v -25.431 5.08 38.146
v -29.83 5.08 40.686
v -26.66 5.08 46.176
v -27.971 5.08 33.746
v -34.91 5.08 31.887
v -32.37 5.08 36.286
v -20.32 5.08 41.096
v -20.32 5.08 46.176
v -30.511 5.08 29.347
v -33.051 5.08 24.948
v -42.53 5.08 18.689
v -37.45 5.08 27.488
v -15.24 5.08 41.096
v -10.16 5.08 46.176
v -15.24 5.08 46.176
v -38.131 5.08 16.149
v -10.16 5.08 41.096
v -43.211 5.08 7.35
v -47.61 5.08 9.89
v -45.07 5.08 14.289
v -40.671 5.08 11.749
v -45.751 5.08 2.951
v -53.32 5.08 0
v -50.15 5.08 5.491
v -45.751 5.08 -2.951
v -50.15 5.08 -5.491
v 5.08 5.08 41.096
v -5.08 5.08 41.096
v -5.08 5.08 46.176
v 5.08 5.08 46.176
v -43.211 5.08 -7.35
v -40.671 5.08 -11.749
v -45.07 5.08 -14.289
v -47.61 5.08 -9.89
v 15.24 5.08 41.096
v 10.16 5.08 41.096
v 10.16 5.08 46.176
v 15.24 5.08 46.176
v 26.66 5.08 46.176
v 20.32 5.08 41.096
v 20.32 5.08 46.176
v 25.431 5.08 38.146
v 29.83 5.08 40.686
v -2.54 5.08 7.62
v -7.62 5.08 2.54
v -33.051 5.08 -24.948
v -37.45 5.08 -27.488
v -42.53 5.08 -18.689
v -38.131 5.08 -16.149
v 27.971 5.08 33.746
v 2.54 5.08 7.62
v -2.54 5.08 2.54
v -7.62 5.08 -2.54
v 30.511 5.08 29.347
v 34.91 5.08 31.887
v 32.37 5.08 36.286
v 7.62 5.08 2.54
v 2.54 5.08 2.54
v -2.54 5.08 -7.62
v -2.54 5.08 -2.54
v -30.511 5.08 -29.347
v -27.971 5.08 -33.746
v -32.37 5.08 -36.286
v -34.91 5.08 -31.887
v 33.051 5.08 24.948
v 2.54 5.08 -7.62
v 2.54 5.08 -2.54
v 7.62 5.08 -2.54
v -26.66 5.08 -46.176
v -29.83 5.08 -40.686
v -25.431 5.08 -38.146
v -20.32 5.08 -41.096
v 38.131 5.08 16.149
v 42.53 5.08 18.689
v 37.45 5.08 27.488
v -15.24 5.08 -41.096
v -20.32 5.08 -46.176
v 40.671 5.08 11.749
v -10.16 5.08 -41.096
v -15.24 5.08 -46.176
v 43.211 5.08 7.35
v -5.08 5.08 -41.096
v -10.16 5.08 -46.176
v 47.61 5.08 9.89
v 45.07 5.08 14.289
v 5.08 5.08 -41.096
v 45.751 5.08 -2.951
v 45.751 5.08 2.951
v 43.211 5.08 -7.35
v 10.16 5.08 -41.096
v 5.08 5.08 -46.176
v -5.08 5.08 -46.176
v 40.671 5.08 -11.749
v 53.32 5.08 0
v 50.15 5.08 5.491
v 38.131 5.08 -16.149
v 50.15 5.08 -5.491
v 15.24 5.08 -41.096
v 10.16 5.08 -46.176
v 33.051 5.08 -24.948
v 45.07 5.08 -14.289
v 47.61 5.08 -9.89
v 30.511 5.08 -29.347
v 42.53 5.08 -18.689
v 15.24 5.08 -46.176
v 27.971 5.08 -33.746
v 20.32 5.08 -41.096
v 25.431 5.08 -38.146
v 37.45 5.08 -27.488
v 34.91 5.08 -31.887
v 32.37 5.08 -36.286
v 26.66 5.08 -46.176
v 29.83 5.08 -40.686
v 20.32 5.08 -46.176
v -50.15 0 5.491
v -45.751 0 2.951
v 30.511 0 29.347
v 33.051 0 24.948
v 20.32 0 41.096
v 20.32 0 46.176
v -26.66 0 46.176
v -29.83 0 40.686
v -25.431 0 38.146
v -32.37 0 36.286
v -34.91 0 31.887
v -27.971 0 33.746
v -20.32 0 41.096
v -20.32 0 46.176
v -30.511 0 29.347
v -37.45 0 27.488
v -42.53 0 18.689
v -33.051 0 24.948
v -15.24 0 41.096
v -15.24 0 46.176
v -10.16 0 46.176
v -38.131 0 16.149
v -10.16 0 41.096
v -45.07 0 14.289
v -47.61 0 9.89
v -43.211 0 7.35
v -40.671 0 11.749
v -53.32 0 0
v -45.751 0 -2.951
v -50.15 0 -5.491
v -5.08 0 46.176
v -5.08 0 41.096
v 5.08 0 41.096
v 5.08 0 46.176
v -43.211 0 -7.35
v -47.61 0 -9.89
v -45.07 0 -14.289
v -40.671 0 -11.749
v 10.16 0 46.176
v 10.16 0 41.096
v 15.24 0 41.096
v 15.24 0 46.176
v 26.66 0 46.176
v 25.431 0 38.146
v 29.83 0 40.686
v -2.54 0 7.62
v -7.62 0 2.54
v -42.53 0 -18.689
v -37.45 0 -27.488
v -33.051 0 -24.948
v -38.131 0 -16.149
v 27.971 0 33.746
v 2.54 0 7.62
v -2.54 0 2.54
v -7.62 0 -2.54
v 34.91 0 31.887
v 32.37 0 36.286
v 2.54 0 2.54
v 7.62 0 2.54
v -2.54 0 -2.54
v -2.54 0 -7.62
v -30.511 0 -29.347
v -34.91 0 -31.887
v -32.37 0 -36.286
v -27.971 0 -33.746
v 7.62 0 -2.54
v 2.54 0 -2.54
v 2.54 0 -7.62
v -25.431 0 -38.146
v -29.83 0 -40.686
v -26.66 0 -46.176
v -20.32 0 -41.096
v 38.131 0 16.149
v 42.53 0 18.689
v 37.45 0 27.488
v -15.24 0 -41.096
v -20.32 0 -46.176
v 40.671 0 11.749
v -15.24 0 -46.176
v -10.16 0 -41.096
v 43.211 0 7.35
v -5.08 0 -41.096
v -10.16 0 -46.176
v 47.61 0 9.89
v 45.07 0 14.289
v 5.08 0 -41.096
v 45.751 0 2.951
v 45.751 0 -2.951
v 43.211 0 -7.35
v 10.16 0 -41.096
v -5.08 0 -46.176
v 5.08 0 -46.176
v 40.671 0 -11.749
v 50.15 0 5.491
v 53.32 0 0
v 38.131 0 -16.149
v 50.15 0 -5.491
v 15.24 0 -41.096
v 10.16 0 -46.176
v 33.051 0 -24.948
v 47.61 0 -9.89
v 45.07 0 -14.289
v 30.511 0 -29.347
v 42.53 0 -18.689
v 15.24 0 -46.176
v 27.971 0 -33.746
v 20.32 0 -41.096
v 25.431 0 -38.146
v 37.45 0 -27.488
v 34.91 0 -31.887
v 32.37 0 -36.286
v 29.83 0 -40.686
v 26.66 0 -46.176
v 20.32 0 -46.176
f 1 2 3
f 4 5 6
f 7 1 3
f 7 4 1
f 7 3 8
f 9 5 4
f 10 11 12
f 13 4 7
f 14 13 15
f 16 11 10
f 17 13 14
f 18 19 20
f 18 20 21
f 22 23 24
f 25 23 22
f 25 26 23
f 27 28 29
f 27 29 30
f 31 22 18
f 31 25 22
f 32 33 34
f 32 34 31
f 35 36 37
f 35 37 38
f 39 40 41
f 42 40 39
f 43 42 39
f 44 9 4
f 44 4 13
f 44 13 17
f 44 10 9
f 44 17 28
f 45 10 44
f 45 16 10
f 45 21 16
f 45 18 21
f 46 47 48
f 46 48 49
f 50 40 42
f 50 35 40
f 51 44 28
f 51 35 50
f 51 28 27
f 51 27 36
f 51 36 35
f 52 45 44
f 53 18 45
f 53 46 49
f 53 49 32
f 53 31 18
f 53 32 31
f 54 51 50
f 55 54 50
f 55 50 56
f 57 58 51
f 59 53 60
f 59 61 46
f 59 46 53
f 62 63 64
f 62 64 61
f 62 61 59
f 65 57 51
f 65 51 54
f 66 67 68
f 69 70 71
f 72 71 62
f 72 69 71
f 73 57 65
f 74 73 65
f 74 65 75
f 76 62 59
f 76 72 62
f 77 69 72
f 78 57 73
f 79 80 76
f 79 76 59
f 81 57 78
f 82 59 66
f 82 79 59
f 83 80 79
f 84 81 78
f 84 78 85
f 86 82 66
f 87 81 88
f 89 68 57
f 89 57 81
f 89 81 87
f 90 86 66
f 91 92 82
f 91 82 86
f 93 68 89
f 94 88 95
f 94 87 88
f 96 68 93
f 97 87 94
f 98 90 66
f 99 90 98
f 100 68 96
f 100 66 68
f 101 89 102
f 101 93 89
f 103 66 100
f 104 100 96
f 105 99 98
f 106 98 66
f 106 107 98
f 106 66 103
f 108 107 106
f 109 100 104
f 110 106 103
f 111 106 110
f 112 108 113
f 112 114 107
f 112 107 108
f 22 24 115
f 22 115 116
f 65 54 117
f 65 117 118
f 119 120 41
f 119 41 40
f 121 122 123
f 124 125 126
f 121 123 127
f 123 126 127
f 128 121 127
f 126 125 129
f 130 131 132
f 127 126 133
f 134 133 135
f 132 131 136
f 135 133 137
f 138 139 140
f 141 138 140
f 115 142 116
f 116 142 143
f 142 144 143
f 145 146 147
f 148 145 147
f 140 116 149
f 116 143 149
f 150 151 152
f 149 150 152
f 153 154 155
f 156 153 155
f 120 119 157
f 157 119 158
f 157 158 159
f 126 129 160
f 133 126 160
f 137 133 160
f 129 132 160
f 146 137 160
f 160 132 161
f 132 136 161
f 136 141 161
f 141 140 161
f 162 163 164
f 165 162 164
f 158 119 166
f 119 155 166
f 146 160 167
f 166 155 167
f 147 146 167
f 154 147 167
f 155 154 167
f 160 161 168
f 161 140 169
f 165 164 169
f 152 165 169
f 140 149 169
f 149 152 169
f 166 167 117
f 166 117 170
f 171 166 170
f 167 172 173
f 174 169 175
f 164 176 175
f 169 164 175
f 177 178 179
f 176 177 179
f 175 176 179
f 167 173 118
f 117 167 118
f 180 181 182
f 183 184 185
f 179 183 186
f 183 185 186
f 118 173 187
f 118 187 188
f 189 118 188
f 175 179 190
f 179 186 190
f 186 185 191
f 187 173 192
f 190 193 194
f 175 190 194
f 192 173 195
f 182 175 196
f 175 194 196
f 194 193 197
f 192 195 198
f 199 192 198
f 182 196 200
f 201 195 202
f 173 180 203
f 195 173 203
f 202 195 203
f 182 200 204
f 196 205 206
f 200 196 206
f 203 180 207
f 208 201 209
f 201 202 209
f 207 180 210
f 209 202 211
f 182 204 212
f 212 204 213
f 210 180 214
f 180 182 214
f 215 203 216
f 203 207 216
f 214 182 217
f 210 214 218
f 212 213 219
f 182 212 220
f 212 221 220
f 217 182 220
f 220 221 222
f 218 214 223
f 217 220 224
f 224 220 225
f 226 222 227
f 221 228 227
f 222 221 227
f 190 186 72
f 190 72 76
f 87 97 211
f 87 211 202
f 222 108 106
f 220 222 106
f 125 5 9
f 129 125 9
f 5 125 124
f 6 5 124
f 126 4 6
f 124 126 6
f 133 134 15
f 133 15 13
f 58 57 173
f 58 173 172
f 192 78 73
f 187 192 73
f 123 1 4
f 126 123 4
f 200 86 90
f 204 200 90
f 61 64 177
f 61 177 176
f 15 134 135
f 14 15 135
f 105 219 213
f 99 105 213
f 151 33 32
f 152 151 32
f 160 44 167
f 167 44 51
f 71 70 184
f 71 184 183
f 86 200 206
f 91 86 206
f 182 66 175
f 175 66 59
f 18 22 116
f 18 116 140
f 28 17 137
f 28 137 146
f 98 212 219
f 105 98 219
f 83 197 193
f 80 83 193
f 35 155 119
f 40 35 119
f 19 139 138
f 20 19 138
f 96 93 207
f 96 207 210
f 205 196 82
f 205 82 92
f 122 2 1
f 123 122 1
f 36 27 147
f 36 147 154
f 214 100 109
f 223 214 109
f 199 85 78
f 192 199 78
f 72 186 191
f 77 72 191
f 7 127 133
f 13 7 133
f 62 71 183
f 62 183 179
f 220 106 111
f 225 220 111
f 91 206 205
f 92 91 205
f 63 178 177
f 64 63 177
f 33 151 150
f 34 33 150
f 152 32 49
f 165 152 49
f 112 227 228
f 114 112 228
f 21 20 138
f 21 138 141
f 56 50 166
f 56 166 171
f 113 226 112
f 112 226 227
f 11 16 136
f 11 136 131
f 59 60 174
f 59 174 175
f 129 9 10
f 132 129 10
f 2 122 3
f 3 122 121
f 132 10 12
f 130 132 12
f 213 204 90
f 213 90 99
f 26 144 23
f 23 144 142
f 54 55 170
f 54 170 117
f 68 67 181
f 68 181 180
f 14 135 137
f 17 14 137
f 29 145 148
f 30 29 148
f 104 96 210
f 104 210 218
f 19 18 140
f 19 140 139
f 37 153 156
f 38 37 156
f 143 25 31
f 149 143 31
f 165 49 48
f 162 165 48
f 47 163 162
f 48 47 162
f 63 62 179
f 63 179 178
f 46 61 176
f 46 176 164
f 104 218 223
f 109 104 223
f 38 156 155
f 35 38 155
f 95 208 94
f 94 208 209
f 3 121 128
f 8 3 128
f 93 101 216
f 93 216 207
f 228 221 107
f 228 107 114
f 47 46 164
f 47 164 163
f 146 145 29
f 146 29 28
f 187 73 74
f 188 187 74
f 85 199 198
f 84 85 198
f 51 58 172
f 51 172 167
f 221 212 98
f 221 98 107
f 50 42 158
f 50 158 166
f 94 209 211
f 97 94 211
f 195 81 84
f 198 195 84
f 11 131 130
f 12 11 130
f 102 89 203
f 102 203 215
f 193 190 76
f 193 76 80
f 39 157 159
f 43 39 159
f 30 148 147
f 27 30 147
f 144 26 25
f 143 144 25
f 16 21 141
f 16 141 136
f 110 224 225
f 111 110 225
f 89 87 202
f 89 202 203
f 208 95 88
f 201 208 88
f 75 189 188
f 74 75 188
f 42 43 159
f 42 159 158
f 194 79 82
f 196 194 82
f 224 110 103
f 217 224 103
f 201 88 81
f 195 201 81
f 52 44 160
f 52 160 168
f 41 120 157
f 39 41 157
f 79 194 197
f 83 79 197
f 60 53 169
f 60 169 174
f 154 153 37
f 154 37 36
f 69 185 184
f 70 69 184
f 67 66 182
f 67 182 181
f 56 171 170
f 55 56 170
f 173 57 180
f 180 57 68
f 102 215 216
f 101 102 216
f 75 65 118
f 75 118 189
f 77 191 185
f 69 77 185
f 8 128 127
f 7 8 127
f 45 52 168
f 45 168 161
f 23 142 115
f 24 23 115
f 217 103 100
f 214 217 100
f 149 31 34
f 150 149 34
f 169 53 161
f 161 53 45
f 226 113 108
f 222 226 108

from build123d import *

# Parameters (mm, degrees)
BOSS_EXTRUDE1_DEPTH = 5.08
SKETCH3_W           = 5.08
SKETCH3_H           = 5.08
CUT_EXTRUDE1_DEPTH  = 5.08
CUT_EXTRUDE2_DEPTH  = 5.08


with BuildPart() as part:
    # Sketch1 → Boss-Extrude1 (new body)
    with BuildSketch(Plane(origin=(0, 0, 0), x_dir=(1, 0, 0), z_dir=(0, 1, 0))):
        Polygon((53.32, 0), (26.66, 46.17647453), (-26.66, 46.17647453), (-53.32, 0), (-26.66, -46.17647453), (26.66, -46.17647453), align=None)
    extrude(amount=BOSS_EXTRUDE1_DEPTH)

    # Sketch3 → Cut-Extrude1 (cut)
    with BuildSketch(Plane(origin=(0, 5.08, 0), x_dir=(1, 0, 0), z_dir=(0, 1, 0))):
        with Locations((-17.78, 43.63647453)):
            Rectangle(SKETCH3_W, SKETCH3_H)
        with Locations((7.62, 43.63647453)):
            Rectangle(SKETCH3_W, SKETCH3_H)
        with Locations((17.78, 43.63647453)):
            Rectangle(SKETCH3_W, SKETCH3_H)
        with Locations((-7.62, 43.63647453)):
            Rectangle(SKETCH3_W, SKETCH3_H)
        Polygon((29.83, 40.68587347), (25.430590949, 38.14587347), (27.970590949, 33.746464419), (32.37, 36.286464419), align=None)
        Polygon((42.53, 18.688828214), (45.07, 14.289419162), (40.670590949, 11.749419162), (38.130590949, 16.148828214), align=None)
        Polygon((47.61, 9.890010111), (50.15, 5.49060106), (45.750590949, 2.95060106), (43.210590949, 7.350010111), align=None)
        Polygon((34.91, 31.887055367), (30.510590949, 29.347055367), (33.050590949, 24.947646316), (37.45, 27.487646316), align=None)
        Polygon((50.15, -5.49060106), (45.750590949, -2.95060106), (43.210590949, -7.350010111), (47.61, -9.890010111), align=None)
        Polygon((37.45, -27.487646316), (34.91, -31.887055367), (30.510590949, -29.347055367), (33.050590949, -24.947646316), align=None)
        Polygon((32.37, -36.286464419), (29.83, -40.68587347), (25.430590949, -38.14587347), (27.970590949, -33.746464419), align=None)
        Polygon((45.07, -14.289419162), (40.670590949, -11.749419162), (38.130590949, -16.148828214), (42.53, -18.688828214), align=None)
        with Locations((17.78, -43.63647453)):
            Rectangle(SKETCH3_W, SKETCH3_H)
        with Locations((-7.62, -43.63647453)):
            Rectangle(SKETCH3_W, SKETCH3_H)
        with Locations((-17.78, -43.63647453)):
            Rectangle(SKETCH3_W, SKETCH3_H)
        with Locations((7.62, -43.63647453)):
            Rectangle(SKETCH3_W, SKETCH3_H)
        Polygon((-29.83, -40.68587347), (-25.430590949, -38.14587347), (-27.970590949, -33.746464419), (-32.37, -36.286464419), align=None)
        Polygon((-42.53, -18.688828214), (-45.07, -14.289419162), (-40.670590949, -11.749419162), (-38.130590949, -16.148828214), align=None)
        Polygon((-47.61, -9.890010111), (-50.15, -5.49060106), (-45.750590949, -2.95060106), (-43.210590949, -7.350010111), align=None)
        Polygon((-34.91, -31.887055367), (-30.510590949, -29.347055367), (-33.050590949, -24.947646316), (-37.45, -27.487646316), align=None)
        Polygon((-50.15, 5.49060106), (-45.750590949, 2.95060106), (-43.210590949, 7.350010111), (-47.61, 9.890010111), align=None)
        Polygon((-37.45, 27.487646316), (-34.91, 31.887055367), (-30.510590949, 29.347055367), (-33.050590949, 24.947646316), align=None)
        Polygon((-32.37, 36.286464419), (-29.83, 40.68587347), (-25.430590949, 38.14587347), (-27.970590949, 33.746464419), align=None)
        Polygon((-45.07, 14.289419162), (-40.670590949, 11.749419162), (-38.130590949, 16.148828214), (-42.53, 18.688828214), align=None)
    extrude(amount=-CUT_EXTRUDE1_DEPTH, mode=Mode.SUBTRACT)

    # Sketch4 → Cut-Extrude2 (cut)
    with BuildSketch(Plane(origin=(0, 5.08, 0), x_dir=(1, 0, 0), z_dir=(0, 1, 0))):
        Polygon((0, 7.62), (2.54, 7.62), (2.54, 2.54), (7.62, 2.54), (7.62, 0), (7.62, -2.54), (2.54, -2.54), (2.54, -7.62), (0, -7.62), (-2.54, -7.62), (-2.54, -2.54), (-7.62, -2.54), (-7.62, 0), (-7.62, 2.54), (-2.54, 2.54), (-2.54, 7.62), align=None)
    extrude(amount=-CUT_EXTRUDE2_DEPTH, mode=Mode.SUBTRACT)


solid = part.part
